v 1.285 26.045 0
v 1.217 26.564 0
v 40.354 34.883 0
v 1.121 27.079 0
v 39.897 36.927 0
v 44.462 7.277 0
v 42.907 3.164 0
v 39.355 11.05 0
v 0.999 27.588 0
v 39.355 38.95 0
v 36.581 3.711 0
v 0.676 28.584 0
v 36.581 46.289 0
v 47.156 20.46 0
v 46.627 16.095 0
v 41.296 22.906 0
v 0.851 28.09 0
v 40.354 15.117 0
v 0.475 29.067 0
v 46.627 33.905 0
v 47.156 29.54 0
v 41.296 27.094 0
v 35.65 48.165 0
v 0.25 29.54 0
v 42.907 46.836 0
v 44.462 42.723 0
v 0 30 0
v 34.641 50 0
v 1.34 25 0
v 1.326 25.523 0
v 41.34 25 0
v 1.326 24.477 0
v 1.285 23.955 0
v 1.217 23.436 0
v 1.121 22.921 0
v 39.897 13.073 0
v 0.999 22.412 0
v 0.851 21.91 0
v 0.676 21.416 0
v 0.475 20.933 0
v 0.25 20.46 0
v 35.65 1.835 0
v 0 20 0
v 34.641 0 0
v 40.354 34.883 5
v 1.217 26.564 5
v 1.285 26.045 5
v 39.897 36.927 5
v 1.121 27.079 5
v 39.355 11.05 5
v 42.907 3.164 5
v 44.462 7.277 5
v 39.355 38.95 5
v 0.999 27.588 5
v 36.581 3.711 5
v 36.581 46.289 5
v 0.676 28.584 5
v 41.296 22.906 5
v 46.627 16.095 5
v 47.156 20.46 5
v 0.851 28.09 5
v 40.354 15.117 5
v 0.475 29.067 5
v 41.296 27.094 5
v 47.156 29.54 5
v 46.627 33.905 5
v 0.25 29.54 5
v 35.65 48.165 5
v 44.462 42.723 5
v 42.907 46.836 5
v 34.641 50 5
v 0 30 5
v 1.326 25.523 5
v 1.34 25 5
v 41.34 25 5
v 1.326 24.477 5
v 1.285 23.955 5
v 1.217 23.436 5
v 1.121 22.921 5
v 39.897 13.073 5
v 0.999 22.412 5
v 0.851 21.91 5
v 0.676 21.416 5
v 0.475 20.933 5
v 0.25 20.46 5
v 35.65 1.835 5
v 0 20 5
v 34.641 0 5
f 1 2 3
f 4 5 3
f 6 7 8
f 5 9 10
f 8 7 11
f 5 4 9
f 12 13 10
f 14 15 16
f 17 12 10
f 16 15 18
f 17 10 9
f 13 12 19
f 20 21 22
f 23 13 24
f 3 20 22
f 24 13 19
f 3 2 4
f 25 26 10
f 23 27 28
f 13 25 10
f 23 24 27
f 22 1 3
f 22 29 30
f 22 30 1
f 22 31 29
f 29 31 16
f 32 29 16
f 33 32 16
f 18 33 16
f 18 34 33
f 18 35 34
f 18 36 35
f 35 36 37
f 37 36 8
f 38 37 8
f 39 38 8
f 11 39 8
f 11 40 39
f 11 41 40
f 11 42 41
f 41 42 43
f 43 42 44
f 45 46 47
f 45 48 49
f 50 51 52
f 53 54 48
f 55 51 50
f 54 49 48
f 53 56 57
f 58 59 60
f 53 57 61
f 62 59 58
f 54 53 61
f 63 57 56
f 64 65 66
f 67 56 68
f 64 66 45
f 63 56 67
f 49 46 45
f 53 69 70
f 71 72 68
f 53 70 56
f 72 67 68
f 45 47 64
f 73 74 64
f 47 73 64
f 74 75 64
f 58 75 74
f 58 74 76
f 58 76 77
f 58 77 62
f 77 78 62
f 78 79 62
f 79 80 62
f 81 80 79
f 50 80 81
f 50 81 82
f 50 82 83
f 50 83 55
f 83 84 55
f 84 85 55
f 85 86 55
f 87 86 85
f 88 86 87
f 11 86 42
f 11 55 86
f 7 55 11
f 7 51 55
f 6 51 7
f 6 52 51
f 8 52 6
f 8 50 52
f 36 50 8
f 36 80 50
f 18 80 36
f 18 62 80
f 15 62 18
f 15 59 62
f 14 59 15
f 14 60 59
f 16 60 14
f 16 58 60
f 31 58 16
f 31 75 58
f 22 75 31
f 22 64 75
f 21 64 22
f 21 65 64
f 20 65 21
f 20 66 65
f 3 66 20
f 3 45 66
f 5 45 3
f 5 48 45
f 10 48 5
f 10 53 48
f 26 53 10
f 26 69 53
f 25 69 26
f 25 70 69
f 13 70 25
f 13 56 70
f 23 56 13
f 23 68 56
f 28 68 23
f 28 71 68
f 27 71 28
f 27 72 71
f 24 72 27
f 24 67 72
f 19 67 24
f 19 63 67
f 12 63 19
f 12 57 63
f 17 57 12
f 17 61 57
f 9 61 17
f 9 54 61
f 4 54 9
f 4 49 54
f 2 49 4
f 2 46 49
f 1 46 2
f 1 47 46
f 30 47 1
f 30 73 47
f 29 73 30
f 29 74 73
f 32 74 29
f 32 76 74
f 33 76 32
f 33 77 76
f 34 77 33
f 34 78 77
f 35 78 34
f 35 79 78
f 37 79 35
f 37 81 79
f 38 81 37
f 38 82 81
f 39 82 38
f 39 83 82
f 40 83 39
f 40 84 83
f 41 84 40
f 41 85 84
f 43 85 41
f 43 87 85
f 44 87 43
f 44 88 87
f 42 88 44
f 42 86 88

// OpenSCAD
$fn = 32;

// ----------------------------------------------------------------------
// Gear sector: 4 teeth on 60 degrees
// ----------------------------------------------------------------------

// --- parameters (mm) ---
sector_angle = 60;        // sector angle, degrees
root_r = 50;              // root circle radius
tooth_h = 6;              // tooth height over the root circle
teeth = 4;                // number of teeth on the sector
hub_r = 10;               // hub bore radius
plate_t = 5;              // sector thickness, Z
arc_step = 3;             // sampling step of the root/hub arcs, degrees

tip_r = root_r + tooth_h;  // tip circle radius

profile = [[34.641, 0], [35.65, 1.835], [36.581, 3.711], [42.907, 3.164], [44.462, 7.277], [39.355, 11.05], [39.897, 13.073], [40.354, 15.117], [46.627, 16.095], [47.156, 20.46], [41.296, 22.906], [41.34, 25], [41.296, 27.094], [47.156, 29.54], [46.627, 33.905], [40.354, 34.883], [39.897, 36.927], [39.355, 38.95], [44.462, 42.723], [42.907, 46.836], [36.581, 46.289], [35.65, 48.165], [34.641, 50], [0, 30], [0.25, 29.54], [0.475, 29.067], [0.676, 28.584], [0.851, 28.09], [0.999, 27.588], [1.121, 27.079], [1.217, 26.564], [1.285, 26.045], [1.326, 25.523], [1.34, 25], [1.326, 24.477], [1.285, 23.955], [1.217, 23.436], [1.121, 22.921], [0.999, 22.412], [0.851, 21.91], [0.676, 21.416], [0.475, 20.933], [0.25, 20.46], [0, 20]];  // primary outline, 44 points, counter clockwise

// --- the one profile operation ---
linear_extrude(height = plate_t) polygon(points = profile);
